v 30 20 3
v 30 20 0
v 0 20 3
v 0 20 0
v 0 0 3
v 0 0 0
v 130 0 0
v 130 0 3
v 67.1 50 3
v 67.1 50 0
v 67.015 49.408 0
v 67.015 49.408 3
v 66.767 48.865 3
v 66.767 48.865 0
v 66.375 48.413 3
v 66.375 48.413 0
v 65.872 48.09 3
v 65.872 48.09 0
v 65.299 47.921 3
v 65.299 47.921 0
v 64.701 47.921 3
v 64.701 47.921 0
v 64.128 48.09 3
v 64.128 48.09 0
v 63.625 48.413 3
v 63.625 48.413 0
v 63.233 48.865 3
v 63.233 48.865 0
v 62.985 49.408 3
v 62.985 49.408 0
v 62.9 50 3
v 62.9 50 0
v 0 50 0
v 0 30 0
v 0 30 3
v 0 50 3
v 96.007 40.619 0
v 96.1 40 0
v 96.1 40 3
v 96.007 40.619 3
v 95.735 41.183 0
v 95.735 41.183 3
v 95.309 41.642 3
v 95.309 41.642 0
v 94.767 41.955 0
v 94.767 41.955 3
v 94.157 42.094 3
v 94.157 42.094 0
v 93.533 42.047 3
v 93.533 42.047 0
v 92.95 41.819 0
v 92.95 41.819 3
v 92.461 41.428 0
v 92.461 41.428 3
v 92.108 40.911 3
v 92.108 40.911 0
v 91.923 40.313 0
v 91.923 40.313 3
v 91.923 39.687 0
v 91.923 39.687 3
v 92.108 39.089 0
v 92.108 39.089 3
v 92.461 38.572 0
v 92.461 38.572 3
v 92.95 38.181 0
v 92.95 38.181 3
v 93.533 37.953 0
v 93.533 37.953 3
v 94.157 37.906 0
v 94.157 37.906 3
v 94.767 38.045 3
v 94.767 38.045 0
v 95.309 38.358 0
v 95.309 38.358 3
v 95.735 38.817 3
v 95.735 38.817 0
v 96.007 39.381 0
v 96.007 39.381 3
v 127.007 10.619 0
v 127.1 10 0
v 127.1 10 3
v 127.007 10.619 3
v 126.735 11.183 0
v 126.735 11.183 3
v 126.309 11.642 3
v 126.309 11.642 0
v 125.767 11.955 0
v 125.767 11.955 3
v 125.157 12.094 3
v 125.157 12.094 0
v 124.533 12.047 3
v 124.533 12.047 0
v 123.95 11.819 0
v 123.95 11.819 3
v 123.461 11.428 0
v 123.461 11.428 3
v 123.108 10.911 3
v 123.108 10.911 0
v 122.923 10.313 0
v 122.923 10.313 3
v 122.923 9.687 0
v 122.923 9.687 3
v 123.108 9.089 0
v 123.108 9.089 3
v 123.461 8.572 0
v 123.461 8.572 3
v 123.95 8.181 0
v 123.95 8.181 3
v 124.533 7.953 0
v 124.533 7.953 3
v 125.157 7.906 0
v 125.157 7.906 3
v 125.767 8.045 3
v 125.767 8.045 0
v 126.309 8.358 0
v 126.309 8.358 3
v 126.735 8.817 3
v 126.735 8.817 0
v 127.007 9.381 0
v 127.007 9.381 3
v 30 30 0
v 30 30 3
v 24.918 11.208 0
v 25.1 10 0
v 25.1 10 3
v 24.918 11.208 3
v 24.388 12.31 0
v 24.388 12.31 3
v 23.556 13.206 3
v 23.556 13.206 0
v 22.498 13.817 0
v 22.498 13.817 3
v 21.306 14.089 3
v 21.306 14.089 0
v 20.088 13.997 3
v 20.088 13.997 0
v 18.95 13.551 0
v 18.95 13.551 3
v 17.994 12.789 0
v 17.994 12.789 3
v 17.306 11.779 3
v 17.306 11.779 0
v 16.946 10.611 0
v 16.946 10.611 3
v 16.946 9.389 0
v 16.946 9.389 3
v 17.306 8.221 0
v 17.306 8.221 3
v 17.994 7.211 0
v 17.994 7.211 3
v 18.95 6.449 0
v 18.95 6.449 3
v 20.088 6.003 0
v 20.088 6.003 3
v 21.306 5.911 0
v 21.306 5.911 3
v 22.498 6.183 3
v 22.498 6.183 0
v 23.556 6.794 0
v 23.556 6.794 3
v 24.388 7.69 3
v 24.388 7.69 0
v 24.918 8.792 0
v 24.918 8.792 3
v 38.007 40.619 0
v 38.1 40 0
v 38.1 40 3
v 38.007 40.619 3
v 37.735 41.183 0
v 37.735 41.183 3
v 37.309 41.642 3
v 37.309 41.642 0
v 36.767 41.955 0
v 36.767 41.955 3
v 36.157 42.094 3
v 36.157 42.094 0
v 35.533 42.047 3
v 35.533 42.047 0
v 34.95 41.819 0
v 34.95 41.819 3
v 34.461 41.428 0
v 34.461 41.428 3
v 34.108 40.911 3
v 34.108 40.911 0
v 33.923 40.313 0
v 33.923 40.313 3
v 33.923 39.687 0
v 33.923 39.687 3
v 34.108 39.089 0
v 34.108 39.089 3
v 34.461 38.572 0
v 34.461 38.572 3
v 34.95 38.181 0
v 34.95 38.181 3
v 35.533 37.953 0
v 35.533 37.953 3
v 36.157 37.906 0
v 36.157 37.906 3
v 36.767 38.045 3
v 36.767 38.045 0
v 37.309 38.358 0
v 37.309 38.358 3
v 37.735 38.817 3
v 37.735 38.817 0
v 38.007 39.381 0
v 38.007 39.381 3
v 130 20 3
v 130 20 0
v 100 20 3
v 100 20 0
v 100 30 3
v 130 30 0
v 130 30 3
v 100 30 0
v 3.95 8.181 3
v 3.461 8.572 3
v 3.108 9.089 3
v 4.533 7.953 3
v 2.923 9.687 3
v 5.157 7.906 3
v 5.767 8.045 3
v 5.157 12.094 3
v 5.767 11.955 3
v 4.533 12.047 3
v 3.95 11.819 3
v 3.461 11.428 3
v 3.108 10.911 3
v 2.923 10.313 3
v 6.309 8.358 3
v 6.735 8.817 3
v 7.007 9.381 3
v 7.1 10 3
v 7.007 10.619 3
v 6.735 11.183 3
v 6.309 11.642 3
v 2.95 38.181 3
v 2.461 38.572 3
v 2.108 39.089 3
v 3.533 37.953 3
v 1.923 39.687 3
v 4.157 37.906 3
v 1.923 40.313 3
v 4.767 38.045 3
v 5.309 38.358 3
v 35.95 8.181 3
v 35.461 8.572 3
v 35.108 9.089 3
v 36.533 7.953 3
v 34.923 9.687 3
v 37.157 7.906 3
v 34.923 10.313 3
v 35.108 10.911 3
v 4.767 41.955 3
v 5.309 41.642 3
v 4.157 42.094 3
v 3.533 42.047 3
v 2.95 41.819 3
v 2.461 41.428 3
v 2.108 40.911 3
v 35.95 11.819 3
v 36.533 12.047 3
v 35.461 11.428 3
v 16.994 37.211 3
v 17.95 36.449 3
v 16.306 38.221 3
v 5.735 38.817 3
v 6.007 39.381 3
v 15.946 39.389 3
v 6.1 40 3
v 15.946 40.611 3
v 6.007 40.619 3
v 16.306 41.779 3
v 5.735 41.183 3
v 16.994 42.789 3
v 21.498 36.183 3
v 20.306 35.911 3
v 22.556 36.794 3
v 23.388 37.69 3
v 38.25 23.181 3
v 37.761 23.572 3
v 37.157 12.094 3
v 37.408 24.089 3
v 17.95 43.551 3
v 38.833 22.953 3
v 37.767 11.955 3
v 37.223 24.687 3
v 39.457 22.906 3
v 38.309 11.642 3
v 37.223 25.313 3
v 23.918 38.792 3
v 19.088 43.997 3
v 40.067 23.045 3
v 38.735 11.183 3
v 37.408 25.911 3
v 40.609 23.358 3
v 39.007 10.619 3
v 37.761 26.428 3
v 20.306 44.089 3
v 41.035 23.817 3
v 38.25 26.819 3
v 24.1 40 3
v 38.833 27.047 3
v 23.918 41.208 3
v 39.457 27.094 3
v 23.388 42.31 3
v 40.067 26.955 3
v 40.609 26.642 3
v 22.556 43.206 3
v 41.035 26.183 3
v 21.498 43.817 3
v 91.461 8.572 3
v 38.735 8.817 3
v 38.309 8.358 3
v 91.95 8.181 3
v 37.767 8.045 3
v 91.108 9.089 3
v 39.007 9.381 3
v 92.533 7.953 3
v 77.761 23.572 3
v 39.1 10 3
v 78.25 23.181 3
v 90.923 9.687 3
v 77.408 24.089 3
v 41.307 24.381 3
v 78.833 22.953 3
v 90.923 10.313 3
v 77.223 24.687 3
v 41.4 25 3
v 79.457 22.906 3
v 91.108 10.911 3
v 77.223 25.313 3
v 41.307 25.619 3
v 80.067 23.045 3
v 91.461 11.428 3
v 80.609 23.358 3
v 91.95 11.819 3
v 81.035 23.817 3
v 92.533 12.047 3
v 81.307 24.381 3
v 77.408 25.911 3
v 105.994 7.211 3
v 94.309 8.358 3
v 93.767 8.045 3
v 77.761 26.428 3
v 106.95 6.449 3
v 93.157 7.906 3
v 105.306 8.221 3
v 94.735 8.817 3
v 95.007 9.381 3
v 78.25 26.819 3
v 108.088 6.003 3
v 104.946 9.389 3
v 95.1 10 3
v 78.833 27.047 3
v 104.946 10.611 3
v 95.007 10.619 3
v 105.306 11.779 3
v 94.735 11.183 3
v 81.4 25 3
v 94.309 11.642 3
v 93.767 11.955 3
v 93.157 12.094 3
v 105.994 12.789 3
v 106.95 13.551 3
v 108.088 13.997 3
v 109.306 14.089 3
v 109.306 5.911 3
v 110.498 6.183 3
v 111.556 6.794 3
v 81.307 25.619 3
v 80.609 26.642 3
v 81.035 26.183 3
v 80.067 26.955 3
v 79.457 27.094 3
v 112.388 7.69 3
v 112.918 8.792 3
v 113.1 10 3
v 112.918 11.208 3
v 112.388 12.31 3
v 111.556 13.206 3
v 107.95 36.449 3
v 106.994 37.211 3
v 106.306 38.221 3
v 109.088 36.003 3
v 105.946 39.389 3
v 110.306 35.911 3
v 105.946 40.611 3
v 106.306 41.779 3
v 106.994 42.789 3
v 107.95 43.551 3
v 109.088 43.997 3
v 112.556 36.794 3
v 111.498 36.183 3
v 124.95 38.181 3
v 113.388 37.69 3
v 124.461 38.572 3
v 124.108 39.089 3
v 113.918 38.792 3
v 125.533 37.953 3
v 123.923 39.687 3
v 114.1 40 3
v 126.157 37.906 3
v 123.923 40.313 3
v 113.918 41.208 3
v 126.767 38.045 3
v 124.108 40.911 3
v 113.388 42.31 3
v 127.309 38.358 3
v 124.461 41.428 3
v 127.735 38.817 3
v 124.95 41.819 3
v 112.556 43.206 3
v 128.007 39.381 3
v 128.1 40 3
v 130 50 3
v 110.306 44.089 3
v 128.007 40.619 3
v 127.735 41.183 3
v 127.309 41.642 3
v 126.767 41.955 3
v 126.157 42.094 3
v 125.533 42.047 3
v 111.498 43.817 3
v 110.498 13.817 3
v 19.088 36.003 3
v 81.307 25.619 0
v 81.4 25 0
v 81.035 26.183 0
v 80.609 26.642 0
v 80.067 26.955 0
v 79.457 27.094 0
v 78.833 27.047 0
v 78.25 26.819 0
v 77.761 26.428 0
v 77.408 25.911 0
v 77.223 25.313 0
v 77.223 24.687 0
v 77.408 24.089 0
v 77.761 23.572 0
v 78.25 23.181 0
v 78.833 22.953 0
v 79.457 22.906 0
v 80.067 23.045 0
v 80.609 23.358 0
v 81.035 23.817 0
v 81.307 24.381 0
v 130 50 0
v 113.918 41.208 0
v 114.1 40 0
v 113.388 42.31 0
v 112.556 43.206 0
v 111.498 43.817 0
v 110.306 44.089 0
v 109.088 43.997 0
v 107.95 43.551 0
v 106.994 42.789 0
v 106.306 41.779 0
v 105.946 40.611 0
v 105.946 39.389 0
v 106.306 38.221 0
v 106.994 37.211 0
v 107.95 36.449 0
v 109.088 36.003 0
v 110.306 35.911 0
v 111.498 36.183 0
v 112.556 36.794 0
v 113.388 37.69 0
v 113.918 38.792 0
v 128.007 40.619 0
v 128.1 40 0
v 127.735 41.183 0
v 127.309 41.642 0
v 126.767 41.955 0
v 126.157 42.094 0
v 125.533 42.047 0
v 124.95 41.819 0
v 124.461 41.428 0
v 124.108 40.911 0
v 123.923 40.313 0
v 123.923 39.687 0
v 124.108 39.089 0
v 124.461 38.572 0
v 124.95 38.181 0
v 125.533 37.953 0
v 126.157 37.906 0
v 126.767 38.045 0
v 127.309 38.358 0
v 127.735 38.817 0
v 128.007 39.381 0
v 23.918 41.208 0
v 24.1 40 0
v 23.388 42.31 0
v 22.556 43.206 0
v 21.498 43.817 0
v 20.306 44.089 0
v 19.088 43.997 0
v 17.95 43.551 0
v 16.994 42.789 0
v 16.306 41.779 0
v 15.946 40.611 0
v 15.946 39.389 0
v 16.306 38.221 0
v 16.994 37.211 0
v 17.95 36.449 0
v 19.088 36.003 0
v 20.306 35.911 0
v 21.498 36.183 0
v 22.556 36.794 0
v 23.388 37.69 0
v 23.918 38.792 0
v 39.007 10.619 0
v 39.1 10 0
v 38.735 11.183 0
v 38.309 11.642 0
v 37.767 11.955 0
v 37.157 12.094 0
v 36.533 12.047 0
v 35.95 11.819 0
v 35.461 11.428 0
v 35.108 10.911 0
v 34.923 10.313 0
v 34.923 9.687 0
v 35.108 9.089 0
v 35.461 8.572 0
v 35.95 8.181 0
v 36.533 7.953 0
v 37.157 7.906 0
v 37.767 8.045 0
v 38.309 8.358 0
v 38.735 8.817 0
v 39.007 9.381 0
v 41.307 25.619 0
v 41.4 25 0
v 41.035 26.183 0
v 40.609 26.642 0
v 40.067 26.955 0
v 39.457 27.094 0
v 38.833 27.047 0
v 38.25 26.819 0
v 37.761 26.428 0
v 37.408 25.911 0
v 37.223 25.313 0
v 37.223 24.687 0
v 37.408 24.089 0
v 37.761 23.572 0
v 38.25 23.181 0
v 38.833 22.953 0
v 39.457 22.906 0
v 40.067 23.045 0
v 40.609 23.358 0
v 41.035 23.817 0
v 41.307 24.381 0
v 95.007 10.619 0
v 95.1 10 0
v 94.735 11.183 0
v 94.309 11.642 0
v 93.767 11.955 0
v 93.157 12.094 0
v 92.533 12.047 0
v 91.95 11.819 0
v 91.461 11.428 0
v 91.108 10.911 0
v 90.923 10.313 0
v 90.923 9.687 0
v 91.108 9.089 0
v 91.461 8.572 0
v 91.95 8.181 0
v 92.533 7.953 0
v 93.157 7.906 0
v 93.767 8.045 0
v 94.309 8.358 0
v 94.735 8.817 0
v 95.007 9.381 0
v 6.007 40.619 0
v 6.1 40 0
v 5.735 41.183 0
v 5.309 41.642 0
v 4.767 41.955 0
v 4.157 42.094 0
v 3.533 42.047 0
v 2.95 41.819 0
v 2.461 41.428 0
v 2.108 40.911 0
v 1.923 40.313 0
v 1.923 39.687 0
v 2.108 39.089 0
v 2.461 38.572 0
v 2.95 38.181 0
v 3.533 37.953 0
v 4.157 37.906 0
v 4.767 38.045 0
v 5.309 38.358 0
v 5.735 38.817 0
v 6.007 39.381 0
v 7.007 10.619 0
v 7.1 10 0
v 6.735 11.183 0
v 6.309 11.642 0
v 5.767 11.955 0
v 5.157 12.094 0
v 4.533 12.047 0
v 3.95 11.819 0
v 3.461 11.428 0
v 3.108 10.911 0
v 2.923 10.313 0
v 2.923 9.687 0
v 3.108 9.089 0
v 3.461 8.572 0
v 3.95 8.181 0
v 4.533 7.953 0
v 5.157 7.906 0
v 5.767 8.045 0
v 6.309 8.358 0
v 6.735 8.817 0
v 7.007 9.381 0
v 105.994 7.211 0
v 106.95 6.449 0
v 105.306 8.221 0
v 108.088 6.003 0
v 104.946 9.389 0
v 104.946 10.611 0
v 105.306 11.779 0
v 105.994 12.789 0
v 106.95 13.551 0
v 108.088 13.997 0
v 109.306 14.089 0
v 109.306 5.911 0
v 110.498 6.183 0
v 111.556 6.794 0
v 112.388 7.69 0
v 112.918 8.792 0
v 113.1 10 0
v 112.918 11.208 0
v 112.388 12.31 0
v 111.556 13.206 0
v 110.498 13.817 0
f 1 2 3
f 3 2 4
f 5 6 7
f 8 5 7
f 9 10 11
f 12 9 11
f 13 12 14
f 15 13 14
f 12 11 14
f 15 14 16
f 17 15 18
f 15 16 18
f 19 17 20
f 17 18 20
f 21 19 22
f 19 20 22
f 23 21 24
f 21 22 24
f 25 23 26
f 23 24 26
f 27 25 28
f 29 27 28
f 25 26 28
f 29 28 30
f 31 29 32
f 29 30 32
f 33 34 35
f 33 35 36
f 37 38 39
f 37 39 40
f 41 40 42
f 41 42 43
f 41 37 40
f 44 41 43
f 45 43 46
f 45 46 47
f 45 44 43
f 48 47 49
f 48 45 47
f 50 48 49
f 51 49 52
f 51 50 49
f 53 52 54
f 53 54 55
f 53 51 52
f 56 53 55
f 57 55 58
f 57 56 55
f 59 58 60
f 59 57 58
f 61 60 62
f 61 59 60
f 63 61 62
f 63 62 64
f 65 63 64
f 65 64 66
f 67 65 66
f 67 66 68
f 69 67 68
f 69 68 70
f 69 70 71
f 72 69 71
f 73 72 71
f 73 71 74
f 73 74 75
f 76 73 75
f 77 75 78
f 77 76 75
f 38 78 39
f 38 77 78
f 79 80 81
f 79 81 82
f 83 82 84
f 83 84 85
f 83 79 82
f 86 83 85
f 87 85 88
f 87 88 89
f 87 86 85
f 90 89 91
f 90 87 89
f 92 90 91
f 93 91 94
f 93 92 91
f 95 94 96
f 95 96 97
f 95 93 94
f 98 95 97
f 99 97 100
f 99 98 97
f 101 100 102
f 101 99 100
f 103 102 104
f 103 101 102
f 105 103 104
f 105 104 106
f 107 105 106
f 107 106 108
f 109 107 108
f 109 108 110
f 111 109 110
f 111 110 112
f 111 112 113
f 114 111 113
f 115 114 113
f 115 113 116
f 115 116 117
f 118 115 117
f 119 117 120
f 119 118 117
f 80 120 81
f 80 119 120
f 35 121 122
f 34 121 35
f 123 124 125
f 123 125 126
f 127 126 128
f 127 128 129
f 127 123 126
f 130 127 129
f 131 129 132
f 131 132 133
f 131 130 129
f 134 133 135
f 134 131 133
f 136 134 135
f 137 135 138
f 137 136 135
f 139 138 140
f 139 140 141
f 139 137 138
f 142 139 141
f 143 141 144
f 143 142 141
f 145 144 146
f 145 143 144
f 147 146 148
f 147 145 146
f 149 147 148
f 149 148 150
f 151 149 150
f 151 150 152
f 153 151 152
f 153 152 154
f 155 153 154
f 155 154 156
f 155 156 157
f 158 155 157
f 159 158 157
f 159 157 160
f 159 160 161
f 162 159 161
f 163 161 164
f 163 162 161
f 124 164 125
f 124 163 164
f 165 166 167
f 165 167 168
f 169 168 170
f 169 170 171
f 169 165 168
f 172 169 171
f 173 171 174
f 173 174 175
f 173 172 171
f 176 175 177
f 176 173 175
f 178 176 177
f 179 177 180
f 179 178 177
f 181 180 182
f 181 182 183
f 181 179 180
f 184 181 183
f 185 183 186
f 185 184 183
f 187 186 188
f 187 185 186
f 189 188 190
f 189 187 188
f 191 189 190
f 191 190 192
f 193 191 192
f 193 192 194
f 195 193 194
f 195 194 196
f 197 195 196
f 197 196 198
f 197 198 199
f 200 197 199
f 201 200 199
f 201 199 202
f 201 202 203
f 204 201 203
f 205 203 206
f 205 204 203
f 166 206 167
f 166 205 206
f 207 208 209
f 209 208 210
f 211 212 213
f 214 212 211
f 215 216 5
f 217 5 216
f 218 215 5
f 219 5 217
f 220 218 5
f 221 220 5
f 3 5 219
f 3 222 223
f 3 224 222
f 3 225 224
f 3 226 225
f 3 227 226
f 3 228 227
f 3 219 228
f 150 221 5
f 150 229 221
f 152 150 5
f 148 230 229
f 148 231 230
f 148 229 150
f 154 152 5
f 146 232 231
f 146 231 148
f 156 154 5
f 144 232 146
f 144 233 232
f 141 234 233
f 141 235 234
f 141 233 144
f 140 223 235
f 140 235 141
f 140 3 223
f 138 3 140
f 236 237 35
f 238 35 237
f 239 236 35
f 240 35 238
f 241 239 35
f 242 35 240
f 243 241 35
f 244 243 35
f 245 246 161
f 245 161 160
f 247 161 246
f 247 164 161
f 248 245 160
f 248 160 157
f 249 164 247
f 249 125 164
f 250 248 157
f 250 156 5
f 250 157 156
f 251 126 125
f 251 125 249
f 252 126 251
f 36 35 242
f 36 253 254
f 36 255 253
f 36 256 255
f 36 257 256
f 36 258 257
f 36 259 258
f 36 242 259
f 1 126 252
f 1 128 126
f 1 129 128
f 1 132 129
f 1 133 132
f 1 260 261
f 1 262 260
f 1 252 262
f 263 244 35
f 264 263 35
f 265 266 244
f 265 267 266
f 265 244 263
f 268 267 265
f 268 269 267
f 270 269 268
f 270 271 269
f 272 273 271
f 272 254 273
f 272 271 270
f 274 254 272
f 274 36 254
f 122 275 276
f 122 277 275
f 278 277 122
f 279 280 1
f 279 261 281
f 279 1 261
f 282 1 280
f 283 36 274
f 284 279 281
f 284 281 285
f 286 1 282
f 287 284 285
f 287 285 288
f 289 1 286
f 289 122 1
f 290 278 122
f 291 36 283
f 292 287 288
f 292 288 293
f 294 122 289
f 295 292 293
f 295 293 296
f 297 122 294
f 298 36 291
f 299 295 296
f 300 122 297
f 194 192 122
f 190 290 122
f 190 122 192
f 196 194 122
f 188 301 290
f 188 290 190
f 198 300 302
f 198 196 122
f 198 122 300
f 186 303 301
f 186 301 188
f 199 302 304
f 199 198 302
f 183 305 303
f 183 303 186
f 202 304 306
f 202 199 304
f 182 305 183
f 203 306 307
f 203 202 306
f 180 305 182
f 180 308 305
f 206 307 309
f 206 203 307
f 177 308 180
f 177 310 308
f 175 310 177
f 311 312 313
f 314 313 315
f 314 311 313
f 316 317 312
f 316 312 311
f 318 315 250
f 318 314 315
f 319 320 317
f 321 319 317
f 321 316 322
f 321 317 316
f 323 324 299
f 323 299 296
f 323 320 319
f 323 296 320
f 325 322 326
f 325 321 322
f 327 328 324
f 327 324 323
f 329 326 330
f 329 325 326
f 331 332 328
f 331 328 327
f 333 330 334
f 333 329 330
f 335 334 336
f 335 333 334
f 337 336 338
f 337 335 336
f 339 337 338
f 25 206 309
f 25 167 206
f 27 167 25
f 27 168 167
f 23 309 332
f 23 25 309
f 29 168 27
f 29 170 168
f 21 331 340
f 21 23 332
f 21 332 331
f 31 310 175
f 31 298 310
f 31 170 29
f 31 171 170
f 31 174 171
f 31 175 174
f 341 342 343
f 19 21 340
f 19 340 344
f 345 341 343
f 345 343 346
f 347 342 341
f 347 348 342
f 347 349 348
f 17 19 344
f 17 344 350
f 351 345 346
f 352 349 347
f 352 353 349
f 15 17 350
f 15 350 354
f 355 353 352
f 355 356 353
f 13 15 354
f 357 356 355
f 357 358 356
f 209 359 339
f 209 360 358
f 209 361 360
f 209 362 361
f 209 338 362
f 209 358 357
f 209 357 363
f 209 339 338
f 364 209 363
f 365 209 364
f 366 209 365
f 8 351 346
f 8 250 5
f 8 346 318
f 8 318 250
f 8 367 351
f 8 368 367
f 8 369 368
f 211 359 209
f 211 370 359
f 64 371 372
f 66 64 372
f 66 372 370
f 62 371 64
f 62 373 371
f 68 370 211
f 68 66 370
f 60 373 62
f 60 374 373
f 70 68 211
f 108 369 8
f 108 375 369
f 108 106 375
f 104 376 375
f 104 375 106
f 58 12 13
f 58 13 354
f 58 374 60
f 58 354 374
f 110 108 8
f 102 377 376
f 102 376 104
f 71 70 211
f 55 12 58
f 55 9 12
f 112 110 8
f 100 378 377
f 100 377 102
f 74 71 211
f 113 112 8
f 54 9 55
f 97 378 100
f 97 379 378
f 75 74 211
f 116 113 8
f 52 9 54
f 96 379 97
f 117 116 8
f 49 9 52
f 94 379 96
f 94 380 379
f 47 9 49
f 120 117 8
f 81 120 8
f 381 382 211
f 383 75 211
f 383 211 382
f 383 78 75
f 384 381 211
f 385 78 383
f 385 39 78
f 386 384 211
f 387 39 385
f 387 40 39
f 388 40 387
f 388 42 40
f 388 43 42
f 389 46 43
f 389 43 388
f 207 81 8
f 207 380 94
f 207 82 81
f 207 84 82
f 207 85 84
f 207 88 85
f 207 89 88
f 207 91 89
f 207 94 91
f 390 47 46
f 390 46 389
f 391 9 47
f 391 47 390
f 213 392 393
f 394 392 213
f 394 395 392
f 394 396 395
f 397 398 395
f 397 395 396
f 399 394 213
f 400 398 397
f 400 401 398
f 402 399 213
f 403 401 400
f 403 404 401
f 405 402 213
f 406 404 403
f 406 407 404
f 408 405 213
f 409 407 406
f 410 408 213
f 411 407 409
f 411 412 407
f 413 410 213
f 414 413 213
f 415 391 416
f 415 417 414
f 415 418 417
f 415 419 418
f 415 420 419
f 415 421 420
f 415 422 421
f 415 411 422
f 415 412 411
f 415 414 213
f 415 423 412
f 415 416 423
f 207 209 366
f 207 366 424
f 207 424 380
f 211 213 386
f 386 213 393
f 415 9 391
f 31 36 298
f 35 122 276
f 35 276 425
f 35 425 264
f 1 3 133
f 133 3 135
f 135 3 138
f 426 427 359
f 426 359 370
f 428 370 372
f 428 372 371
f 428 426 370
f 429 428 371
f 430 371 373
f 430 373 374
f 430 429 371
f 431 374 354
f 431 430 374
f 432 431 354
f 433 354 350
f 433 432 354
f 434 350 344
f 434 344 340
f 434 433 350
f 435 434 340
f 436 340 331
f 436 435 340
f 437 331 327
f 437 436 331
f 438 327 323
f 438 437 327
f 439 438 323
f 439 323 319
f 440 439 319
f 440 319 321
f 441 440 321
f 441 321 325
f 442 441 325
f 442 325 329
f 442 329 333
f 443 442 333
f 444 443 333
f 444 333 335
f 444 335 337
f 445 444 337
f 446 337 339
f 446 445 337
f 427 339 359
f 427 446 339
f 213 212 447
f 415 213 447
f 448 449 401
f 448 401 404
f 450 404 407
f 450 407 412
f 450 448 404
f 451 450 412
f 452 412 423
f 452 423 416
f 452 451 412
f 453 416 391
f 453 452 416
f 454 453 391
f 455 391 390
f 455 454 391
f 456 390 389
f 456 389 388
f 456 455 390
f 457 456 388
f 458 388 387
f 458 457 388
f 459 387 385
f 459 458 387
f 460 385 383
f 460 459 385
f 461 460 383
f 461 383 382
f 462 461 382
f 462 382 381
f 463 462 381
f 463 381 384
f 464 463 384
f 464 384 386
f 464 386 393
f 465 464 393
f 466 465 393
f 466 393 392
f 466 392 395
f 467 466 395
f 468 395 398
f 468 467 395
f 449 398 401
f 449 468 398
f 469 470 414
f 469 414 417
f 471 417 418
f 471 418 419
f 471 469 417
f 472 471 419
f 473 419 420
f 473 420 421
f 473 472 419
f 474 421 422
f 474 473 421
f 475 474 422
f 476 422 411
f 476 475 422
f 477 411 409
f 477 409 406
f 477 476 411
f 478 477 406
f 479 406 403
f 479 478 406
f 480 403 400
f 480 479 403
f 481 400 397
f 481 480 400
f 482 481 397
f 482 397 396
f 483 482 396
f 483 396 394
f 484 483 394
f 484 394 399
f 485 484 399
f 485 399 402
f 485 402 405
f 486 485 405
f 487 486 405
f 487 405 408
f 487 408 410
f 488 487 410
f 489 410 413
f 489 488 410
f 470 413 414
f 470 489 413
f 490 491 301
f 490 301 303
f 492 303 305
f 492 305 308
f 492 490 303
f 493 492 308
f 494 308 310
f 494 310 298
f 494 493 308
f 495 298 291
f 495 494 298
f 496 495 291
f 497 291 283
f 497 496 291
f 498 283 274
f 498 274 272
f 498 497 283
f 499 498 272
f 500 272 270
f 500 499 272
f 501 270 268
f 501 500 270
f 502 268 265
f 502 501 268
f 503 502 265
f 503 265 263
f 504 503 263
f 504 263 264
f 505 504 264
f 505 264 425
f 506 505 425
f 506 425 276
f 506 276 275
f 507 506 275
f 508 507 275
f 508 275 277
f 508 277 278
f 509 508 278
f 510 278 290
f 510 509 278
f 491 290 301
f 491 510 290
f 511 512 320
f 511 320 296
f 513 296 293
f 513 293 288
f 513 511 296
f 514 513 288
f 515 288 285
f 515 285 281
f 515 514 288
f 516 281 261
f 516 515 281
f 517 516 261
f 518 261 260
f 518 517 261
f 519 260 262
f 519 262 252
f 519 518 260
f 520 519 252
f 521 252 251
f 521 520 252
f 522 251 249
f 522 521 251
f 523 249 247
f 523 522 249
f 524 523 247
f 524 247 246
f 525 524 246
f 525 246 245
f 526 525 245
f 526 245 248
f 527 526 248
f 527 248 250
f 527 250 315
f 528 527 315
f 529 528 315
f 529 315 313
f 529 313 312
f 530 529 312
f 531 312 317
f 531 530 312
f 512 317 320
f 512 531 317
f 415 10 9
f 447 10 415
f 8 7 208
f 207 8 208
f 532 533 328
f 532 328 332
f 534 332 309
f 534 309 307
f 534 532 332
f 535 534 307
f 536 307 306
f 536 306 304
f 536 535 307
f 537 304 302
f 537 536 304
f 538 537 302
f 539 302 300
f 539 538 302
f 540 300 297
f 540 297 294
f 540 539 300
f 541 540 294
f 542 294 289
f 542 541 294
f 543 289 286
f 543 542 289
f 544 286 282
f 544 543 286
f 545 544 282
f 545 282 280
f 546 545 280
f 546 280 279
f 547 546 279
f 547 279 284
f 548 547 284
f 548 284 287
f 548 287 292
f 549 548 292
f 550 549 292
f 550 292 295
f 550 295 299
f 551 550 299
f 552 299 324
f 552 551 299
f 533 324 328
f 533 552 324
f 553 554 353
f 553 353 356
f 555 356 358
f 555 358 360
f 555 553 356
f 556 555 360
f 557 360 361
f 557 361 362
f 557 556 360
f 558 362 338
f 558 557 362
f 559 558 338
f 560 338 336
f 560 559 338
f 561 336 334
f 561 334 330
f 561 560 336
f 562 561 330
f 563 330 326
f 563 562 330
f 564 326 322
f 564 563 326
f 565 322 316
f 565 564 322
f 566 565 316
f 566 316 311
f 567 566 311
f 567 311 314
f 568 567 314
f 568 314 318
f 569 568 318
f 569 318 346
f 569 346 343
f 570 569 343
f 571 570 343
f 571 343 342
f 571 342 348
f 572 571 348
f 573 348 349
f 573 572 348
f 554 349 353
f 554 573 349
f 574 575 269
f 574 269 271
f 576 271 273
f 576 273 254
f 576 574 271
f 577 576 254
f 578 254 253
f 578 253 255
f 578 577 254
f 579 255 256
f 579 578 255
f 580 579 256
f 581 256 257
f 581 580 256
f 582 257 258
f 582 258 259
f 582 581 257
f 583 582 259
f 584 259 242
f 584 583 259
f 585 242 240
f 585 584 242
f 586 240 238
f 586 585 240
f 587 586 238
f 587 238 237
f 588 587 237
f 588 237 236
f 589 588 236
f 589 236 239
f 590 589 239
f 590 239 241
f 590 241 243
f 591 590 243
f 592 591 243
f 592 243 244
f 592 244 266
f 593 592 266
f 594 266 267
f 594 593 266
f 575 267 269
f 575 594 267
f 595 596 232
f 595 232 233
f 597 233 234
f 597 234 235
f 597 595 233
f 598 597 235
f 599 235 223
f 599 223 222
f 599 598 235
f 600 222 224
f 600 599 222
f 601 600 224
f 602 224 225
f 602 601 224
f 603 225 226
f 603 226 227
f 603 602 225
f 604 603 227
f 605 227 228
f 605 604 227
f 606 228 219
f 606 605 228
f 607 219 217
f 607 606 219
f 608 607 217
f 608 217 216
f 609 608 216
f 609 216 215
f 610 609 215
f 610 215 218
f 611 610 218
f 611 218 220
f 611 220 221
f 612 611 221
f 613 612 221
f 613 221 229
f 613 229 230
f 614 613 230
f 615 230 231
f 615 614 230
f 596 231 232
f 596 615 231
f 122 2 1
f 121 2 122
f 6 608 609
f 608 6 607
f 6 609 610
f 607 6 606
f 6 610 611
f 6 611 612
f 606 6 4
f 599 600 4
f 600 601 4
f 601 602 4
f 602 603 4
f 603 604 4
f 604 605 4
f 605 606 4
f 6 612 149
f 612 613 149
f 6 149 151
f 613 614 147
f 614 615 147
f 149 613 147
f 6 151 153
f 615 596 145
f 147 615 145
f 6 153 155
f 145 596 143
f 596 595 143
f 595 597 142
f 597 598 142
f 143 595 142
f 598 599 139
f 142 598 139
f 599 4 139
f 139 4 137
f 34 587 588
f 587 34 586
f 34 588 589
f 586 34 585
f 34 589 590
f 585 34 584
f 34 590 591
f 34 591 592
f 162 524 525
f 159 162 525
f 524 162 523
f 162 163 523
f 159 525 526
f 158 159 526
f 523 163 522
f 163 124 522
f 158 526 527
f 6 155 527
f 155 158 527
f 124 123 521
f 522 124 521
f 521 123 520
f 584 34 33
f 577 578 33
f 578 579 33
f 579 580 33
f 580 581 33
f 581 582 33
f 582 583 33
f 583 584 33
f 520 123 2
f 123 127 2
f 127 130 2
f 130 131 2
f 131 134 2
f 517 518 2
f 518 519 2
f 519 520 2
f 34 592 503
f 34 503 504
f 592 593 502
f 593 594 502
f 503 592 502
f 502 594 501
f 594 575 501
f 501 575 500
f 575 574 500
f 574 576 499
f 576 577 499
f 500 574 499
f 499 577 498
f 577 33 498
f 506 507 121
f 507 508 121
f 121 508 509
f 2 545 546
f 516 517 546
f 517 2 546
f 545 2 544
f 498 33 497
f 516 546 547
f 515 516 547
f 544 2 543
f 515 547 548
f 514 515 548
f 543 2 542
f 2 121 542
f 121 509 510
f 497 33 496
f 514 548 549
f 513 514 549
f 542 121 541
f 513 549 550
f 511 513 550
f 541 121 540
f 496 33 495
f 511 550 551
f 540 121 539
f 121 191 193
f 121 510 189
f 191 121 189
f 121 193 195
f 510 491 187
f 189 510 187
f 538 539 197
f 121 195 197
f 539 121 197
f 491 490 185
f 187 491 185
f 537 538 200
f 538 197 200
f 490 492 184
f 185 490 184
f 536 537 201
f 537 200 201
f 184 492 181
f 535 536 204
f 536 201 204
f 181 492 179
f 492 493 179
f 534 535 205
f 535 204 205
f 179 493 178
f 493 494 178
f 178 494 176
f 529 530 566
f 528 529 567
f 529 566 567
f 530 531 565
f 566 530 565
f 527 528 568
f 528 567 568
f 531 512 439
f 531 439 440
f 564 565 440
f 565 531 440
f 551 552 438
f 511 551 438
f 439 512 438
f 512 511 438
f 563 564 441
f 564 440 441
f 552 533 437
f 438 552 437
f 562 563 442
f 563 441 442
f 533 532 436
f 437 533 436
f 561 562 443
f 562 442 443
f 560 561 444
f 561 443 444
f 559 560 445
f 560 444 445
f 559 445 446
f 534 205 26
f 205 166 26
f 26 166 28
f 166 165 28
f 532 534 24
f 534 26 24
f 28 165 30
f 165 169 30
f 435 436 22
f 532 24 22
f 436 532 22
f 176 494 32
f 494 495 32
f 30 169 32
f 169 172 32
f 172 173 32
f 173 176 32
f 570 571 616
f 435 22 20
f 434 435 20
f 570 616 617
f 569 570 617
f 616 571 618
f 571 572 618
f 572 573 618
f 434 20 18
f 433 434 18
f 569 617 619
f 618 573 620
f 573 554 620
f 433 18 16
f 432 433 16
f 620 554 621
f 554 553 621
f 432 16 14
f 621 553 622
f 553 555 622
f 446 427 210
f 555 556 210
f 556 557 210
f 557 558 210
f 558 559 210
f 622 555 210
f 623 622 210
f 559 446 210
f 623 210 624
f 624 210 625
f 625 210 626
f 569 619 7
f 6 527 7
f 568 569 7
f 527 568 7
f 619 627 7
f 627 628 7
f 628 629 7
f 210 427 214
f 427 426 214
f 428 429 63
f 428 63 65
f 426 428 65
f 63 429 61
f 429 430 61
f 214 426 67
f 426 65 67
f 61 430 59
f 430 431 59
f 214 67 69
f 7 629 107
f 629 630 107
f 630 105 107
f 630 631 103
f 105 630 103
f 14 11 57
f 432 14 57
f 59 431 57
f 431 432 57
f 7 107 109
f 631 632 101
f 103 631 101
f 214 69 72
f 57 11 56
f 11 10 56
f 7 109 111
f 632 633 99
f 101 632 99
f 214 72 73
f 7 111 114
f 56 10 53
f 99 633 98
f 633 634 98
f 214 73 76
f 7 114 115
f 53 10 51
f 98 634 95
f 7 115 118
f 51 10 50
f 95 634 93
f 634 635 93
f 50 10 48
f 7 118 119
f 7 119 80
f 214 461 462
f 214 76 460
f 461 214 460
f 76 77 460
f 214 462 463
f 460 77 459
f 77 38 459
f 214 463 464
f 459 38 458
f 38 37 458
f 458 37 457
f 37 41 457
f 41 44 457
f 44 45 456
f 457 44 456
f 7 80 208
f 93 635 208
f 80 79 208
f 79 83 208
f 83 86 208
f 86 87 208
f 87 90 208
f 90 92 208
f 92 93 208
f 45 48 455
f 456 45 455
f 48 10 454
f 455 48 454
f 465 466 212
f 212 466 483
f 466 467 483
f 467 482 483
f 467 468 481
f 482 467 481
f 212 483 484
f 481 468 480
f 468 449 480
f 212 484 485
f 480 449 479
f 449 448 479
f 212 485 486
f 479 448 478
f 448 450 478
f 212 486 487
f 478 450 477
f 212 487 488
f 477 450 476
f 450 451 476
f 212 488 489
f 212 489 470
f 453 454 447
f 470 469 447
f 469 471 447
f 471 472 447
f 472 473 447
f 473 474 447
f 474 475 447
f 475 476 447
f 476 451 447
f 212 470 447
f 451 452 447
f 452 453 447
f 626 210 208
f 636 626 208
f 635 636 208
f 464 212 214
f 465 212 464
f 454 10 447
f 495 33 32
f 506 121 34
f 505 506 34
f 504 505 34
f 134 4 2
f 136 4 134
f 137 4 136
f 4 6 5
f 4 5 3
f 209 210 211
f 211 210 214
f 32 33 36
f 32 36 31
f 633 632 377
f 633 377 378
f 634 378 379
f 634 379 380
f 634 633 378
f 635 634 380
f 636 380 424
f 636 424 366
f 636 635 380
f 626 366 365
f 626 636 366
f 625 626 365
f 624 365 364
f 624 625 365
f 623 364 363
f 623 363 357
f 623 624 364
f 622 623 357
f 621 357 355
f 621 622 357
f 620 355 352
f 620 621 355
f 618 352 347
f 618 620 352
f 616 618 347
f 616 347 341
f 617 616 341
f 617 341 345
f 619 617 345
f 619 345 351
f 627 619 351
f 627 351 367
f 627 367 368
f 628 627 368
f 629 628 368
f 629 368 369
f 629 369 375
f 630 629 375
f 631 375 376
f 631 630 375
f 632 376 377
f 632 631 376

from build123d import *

# Parameters (mm, degrees)
ESQUISSE1_W             = 130
ESQUISSE1_H             = 50
ESQUISSE1_R             = 2.1
ESQUISSE1_R_2           = 4.1
BOSS_EXTRU_1_DEPTH      = 3
ENL_V_MAT_EXTRU_1_REACH = 5
ESQUISSE2_W             = 30
ESQUISSE2_H             = 10


with BuildPart() as part:
    # Esquisse1 → Boss.-Extru.1 (new body)
    with BuildSketch(Plane.XY):
        with Locations((65, 25)):
            Rectangle(ESQUISSE1_W, ESQUISSE1_H)
        with Locations((4, 40)):
            Circle(ESQUISSE1_R, mode=Mode.SUBTRACT)
        with Locations((20, 40)):
            Circle(ESQUISSE1_R_2, mode=Mode.SUBTRACT)
        with Locations((36, 40)):
            Circle(ESQUISSE1_R, mode=Mode.SUBTRACT)
        with Locations((94, 40)):
            Circle(ESQUISSE1_R, mode=Mode.SUBTRACT)
        with Locations((110, 40)):
            Circle(ESQUISSE1_R_2, mode=Mode.SUBTRACT)
        with Locations((126, 40)):
            Circle(ESQUISSE1_R, mode=Mode.SUBTRACT)
        with Locations((5, 10)):
            Circle(ESQUISSE1_R, mode=Mode.SUBTRACT)
        with Locations((21, 10)):
            Circle(ESQUISSE1_R_2, mode=Mode.SUBTRACT)
        with Locations((37, 10)):
            Circle(ESQUISSE1_R, mode=Mode.SUBTRACT)
        with Locations((93, 10)):
            Circle(ESQUISSE1_R, mode=Mode.SUBTRACT)
        with Locations((109, 10)):
            Circle(ESQUISSE1_R_2, mode=Mode.SUBTRACT)
        with Locations((125, 10)):
            Circle(ESQUISSE1_R, mode=Mode.SUBTRACT)
        with Locations((39.3, 25)):
            Circle(ESQUISSE1_R, mode=Mode.SUBTRACT)
        with Locations((79.3, 25)):
            Circle(ESQUISSE1_R, mode=Mode.SUBTRACT)
    extrude(amount=BOSS_EXTRU_1_DEPTH)

    # Esquisse2 → Enlèv. mat.-Extru.1 (cut, up to next)
    with BuildSketch(Plane(origin=(0, 0, 0), x_dir=(-1, 0, 0), z_dir=(0, 0, -1)), mode=Mode.PRIVATE) as enl_v_mat_extru_1_sk1:
        with Locations((-15, 25)):
            Rectangle(ESQUISSE2_W, ESQUISSE2_H)
    enl_v_mat_extru_1_tool1 = extrude(enl_v_mat_extru_1_sk1.sketch, amount=-ENL_V_MAT_EXTRU_1_REACH, mode=Mode.PRIVATE) & part.part
    add(enl_v_mat_extru_1_tool1.solids().sort_by_distance((15, 25, 0))[0], mode=Mode.SUBTRACT)
    # Esquisse2 → Enlèv. mat.-Extru.1 (cut, up to next)
    with BuildSketch(Plane(origin=(0, 0, 0), x_dir=(-1, 0, 0), z_dir=(0, 0, -1)), mode=Mode.PRIVATE) as enl_v_mat_extru_1_sk2:
        with Locations((-115, 25)):
            Rectangle(ESQUISSE2_W, ESQUISSE2_H)
    enl_v_mat_extru_1_tool2 = extrude(enl_v_mat_extru_1_sk2.sketch, amount=-ENL_V_MAT_EXTRU_1_REACH, mode=Mode.PRIVATE) & part.part
    add(enl_v_mat_extru_1_tool2.solids().sort_by_distance((115, 25, 0))[0], mode=Mode.SUBTRACT)
    # Esquisse2 → Enlèv. mat.-Extru.1 (cut, up to next)
    with BuildSketch(Plane(origin=(0, 0, 0), x_dir=(-1, 0, 0), z_dir=(0, 0, -1)), mode=Mode.PRIVATE) as enl_v_mat_extru_1_sk3:
        with BuildLine():
            Line((-62.9, 50), (-67.1, 50))
            ThreePointArc((-67.1, 50), (-65, 47.9), (-62.9, 50))
        make_face()
    enl_v_mat_extru_1_tool3 = extrude(enl_v_mat_extru_1_sk3.sketch, amount=-ENL_V_MAT_EXTRU_1_REACH, mode=Mode.PRIVATE) & part.part
    add(enl_v_mat_extru_1_tool3.solids().sort_by_distance((65, 49.108732, 0))[0], mode=Mode.SUBTRACT)


solid = part.part
